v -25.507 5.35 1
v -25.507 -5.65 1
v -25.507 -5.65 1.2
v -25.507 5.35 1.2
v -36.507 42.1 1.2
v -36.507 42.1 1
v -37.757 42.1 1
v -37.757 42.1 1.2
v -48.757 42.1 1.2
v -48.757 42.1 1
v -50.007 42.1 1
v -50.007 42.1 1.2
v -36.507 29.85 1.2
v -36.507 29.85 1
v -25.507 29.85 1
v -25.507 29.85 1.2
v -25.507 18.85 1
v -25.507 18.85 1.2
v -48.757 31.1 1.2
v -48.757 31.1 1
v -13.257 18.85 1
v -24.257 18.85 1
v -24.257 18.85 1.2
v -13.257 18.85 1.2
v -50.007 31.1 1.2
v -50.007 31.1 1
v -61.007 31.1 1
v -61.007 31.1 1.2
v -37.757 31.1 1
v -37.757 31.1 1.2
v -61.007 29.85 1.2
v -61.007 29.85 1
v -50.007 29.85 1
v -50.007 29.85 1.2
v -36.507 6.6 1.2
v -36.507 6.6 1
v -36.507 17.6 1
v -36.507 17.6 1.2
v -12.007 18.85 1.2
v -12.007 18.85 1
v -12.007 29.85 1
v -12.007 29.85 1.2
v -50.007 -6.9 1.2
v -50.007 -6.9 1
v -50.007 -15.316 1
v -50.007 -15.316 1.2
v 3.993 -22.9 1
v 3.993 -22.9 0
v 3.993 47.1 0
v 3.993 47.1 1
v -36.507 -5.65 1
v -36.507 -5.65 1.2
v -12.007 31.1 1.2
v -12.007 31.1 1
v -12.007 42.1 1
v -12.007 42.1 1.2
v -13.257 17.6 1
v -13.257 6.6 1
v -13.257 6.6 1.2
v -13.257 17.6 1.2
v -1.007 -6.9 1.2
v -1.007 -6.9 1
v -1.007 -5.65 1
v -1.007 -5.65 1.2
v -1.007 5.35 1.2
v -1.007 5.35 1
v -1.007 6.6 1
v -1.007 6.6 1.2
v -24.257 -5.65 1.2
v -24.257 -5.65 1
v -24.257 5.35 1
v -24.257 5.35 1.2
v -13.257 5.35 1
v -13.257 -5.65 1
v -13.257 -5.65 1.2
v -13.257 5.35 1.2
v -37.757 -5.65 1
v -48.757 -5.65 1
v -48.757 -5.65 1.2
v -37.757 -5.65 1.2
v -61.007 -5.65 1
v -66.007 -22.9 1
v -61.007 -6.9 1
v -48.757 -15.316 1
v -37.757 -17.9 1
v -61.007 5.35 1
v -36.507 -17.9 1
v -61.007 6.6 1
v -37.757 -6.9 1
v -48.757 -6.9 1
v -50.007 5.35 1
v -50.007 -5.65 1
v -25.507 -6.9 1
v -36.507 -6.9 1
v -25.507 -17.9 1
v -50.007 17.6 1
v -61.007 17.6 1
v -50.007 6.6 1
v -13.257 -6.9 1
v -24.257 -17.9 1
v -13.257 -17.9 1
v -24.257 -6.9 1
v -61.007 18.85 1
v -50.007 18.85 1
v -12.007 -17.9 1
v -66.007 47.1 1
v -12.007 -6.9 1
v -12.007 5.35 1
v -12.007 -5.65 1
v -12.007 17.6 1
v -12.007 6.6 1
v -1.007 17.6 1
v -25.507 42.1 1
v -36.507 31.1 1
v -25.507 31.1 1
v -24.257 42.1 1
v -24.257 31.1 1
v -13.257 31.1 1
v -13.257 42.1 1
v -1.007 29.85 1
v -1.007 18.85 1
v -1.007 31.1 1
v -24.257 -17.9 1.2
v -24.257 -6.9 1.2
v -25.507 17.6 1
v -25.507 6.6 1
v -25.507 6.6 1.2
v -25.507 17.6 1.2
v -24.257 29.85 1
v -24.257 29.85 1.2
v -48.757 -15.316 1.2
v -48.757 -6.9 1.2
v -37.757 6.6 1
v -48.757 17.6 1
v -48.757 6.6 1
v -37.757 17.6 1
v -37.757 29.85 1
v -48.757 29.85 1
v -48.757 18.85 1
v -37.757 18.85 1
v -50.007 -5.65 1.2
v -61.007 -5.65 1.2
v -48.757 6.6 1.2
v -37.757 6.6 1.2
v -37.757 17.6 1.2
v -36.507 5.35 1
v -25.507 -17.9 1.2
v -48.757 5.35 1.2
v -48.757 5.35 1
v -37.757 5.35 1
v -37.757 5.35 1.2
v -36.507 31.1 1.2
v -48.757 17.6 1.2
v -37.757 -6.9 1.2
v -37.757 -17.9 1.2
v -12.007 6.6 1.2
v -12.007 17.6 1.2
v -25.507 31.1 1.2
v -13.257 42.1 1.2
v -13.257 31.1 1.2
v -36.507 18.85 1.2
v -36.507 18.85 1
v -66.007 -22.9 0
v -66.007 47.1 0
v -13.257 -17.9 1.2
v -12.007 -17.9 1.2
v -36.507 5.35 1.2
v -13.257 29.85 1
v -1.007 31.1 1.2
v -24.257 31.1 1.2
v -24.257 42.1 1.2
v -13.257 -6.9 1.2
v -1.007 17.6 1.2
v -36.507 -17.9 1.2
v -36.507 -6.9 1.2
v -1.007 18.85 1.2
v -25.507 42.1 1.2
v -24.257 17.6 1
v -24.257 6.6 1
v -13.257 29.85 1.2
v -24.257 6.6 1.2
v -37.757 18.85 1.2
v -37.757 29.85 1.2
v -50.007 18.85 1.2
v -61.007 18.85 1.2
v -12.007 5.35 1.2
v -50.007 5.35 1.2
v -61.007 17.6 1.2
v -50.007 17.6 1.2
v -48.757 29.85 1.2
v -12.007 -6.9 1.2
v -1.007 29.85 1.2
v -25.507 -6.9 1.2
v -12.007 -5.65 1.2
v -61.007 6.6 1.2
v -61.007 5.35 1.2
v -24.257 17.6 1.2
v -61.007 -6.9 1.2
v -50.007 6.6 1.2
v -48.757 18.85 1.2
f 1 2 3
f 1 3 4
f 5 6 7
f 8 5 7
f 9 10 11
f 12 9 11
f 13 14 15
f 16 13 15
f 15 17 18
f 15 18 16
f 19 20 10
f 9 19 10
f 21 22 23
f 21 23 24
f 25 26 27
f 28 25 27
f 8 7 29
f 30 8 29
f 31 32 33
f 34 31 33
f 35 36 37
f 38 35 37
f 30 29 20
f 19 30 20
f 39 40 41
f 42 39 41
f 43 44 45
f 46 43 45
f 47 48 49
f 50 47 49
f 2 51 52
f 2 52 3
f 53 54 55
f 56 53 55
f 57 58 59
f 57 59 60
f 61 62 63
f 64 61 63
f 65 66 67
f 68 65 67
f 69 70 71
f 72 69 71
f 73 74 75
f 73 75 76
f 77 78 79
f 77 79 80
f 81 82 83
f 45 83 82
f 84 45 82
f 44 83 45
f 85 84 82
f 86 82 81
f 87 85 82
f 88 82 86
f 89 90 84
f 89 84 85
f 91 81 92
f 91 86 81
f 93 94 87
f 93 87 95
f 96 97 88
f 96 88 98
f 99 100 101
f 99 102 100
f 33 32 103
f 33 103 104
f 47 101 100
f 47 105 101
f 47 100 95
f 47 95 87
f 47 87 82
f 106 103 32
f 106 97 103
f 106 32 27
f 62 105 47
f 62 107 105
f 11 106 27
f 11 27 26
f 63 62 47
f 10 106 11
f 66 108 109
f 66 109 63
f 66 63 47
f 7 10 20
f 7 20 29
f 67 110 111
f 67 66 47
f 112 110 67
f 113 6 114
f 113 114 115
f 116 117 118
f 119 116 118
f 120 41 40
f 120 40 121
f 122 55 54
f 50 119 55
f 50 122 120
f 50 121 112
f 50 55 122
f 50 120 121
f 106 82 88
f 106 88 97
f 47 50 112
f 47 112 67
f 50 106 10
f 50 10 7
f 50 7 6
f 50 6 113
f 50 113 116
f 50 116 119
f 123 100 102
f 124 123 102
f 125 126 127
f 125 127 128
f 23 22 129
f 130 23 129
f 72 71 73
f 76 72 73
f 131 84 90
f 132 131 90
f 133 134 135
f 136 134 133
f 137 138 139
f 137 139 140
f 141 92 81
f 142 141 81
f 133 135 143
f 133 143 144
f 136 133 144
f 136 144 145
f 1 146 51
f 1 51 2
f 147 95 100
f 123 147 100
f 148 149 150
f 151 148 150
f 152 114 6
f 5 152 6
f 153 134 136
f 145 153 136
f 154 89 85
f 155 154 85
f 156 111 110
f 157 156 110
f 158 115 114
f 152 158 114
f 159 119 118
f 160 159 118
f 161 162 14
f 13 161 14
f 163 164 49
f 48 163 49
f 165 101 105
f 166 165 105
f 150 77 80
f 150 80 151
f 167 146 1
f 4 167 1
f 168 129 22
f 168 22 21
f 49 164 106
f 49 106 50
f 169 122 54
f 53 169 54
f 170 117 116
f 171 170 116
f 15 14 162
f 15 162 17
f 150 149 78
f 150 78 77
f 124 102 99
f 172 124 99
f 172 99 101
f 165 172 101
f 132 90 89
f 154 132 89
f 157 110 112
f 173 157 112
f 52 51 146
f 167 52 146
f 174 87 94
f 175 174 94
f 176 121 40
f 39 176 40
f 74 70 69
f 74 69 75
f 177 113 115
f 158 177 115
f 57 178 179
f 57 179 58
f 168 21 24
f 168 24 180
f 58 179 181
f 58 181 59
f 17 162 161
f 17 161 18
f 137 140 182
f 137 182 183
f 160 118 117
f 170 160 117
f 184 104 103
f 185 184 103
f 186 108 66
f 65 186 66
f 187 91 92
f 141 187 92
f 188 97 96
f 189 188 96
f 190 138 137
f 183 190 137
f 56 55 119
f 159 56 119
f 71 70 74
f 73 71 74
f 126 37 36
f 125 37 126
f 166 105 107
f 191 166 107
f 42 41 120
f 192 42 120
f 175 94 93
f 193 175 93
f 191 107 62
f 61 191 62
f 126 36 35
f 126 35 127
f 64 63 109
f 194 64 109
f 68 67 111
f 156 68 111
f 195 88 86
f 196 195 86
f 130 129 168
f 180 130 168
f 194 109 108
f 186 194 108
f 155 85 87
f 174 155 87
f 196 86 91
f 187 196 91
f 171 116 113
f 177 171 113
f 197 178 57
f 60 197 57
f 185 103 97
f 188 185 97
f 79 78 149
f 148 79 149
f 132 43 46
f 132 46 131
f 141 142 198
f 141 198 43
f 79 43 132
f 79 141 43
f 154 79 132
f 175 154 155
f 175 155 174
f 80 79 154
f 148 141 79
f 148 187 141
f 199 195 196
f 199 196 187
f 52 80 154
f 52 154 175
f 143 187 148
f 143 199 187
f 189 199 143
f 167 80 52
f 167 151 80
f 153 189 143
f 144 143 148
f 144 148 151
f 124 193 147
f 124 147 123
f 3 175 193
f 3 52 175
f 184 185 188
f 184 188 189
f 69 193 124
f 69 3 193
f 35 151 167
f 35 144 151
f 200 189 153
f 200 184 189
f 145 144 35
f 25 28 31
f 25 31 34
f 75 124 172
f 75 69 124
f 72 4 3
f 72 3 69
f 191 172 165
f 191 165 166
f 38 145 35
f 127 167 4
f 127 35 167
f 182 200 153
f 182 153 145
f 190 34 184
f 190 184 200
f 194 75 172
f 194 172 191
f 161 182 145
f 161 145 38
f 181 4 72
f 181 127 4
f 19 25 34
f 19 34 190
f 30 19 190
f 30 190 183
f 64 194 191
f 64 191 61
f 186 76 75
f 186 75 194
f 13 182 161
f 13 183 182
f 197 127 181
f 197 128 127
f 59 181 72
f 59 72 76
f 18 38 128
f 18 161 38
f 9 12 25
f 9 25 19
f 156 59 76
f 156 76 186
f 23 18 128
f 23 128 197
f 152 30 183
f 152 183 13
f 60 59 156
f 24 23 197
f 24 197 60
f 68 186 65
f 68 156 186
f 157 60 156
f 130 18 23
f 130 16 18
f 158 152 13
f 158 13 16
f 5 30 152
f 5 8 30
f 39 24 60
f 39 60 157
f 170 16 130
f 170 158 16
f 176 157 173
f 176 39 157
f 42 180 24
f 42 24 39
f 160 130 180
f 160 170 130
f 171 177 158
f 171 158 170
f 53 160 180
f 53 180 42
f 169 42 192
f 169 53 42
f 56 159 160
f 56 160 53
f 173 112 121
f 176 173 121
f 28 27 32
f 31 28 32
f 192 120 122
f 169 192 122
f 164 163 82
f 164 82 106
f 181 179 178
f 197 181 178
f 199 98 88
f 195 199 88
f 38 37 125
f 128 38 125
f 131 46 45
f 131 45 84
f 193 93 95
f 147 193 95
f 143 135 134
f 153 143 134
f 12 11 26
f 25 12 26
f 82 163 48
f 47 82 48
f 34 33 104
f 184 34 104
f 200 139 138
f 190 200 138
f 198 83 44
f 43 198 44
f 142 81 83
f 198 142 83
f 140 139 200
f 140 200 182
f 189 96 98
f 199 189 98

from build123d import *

# Parameters (mm, degrees)
SKETCH1_W           = 70
SKETCH1_H           = 70
BOSS_EXTRUDE1_DEPTH = 1
SKETCH3_W           = 11
SKETCH3_H           = 11
BOSS_EXTRUDE2_DEPTH = 0.2
SKETCH4_W           = 5.900984105
SKETCH4_H           = 4.163778505
CUT_EXTRUDE3_DEPTH  = 0.2


with BuildPart() as part:
    # Sketch1 → Boss-Extrude1 (new body)
    with BuildSketch(Plane.XY):
        with Locations((-31.007117438, 12.099644128)):
            Rectangle(SKETCH1_W, SKETCH1_H)
    extrude(amount=BOSS_EXTRUDE1_DEPTH)

    # Sketch3 → Boss-Extrude2 (add)
    with BuildSketch(Plane.XY.offset(1)):
        Polygon((-48.757117438, 42.099644128), (-50.007117438, 42.099644128), (-50.007117438, 31.099644128), (-61.007117438, 31.099644128), (-61.007117438, 29.849644128), (-50.007117438, 29.849644128), (-50.007117438, 18.849644128), (-61.007117438, 18.849644128), (-61.007117438, 17.599644128), (-50.007117438, 17.599644128), (-50.007117438, 6.599644128), (-61.007117438, 6.599644128), (-61.007117438, 5.349644128), (-50.007117438, 5.349644128), (-50.007117438, -5.650355872), (-61.007117438, -5.650355872), (-61.007117438, -6.900355872), (-50.007117438, -6.900355872), (-50.007117438, -17.900355872), (-48.757117438, -17.900355872), (-48.757117438, -6.900355872), (-37.757117438, -6.900355872), (-37.757117438, -17.900355872), (-36.507117438, -17.900355872), (-36.507117438, -6.900355872), (-25.507117438, -6.900355872), (-25.507117438, -17.900355872), (-24.257117438, -17.900355872), (-24.257117438, -6.900355872), (-13.257117438, -6.900355872), (-13.257117438, -17.900355872), (-12.007117438, -17.900355872), (-12.007117438, -6.900355872), (-1.007117438, -6.900355872), (-1.007117438, -5.650355872), (-12.007117438, -5.650355872), (-12.007117438, 5.349644128), (-1.007117438, 5.349644128), (-1.007117438, 6.599644128), (-12.007117438, 6.599644128), (-12.007117438, 17.599644128), (-1.007117438, 17.599644128), (-1.007117438, 18.849644128), (-12.007117438, 18.849644128), (-12.007117438, 29.849644128), (-1.007117438, 29.849644128), (-1.007117438, 31.099644128), (-12.007117438, 31.099644128), (-12.007117438, 42.099644128), (-13.257117438, 42.099644128), (-13.257117438, 31.099644128), (-24.257117438, 31.099644128), (-24.257117438, 42.099644128), (-25.507117438, 42.099644128), (-25.507117438, 31.099644128), (-36.507117438, 31.099644128), (-36.507117438, 42.099644128), (-37.757117438, 42.099644128), (-37.757117438, 31.099644128), (-48.757117438, 31.099644128), align=None)
        with Locations((-43.257117438, -0.150355872)):
            Rectangle(SKETCH3_W, SKETCH3_H, mode=Mode.SUBTRACT)
        with Locations((-31.007117438, -0.150355872)):
            Rectangle(SKETCH3_W, SKETCH3_H, mode=Mode.SUBTRACT)
        with Locations((-18.757117438, -0.150355872)):
            Rectangle(SKETCH3_W, SKETCH3_H, mode=Mode.SUBTRACT)
        with Locations((-43.257117438, 12.099644128)):
            Rectangle(SKETCH3_W, SKETCH3_H, mode=Mode.SUBTRACT)
        with Locations((-43.257117438, 24.349644128)):
            Rectangle(SKETCH3_W, SKETCH3_H, mode=Mode.SUBTRACT)
        with Locations((-31.007117438, 12.099644128)):
            Rectangle(SKETCH3_W, SKETCH3_H, mode=Mode.SUBTRACT)
        with Locations((-18.757117438, 12.099644128)):
            Rectangle(SKETCH3_W, SKETCH3_H, mode=Mode.SUBTRACT)
        with Locations((-31.007117438, 24.349644128)):
            Rectangle(SKETCH3_W, SKETCH3_H, mode=Mode.SUBTRACT)
        with Locations((-18.757117438, 24.349644128)):
            Rectangle(SKETCH3_W, SKETCH3_H, mode=Mode.SUBTRACT)
    extrude(amount=BOSS_EXTRUDE2_DEPTH)

    # Sketch4 → Cut-Extrude3 (cut)
    with BuildSketch(Plane.XY.offset(1.2)):
        with Locations((-50.439270902, -17.397627398)):
            Rectangle(SKETCH4_W, SKETCH4_H)
    extrude(amount=-CUT_EXTRUDE3_DEPTH, mode=Mode.SUBTRACT)


solid = part.part
